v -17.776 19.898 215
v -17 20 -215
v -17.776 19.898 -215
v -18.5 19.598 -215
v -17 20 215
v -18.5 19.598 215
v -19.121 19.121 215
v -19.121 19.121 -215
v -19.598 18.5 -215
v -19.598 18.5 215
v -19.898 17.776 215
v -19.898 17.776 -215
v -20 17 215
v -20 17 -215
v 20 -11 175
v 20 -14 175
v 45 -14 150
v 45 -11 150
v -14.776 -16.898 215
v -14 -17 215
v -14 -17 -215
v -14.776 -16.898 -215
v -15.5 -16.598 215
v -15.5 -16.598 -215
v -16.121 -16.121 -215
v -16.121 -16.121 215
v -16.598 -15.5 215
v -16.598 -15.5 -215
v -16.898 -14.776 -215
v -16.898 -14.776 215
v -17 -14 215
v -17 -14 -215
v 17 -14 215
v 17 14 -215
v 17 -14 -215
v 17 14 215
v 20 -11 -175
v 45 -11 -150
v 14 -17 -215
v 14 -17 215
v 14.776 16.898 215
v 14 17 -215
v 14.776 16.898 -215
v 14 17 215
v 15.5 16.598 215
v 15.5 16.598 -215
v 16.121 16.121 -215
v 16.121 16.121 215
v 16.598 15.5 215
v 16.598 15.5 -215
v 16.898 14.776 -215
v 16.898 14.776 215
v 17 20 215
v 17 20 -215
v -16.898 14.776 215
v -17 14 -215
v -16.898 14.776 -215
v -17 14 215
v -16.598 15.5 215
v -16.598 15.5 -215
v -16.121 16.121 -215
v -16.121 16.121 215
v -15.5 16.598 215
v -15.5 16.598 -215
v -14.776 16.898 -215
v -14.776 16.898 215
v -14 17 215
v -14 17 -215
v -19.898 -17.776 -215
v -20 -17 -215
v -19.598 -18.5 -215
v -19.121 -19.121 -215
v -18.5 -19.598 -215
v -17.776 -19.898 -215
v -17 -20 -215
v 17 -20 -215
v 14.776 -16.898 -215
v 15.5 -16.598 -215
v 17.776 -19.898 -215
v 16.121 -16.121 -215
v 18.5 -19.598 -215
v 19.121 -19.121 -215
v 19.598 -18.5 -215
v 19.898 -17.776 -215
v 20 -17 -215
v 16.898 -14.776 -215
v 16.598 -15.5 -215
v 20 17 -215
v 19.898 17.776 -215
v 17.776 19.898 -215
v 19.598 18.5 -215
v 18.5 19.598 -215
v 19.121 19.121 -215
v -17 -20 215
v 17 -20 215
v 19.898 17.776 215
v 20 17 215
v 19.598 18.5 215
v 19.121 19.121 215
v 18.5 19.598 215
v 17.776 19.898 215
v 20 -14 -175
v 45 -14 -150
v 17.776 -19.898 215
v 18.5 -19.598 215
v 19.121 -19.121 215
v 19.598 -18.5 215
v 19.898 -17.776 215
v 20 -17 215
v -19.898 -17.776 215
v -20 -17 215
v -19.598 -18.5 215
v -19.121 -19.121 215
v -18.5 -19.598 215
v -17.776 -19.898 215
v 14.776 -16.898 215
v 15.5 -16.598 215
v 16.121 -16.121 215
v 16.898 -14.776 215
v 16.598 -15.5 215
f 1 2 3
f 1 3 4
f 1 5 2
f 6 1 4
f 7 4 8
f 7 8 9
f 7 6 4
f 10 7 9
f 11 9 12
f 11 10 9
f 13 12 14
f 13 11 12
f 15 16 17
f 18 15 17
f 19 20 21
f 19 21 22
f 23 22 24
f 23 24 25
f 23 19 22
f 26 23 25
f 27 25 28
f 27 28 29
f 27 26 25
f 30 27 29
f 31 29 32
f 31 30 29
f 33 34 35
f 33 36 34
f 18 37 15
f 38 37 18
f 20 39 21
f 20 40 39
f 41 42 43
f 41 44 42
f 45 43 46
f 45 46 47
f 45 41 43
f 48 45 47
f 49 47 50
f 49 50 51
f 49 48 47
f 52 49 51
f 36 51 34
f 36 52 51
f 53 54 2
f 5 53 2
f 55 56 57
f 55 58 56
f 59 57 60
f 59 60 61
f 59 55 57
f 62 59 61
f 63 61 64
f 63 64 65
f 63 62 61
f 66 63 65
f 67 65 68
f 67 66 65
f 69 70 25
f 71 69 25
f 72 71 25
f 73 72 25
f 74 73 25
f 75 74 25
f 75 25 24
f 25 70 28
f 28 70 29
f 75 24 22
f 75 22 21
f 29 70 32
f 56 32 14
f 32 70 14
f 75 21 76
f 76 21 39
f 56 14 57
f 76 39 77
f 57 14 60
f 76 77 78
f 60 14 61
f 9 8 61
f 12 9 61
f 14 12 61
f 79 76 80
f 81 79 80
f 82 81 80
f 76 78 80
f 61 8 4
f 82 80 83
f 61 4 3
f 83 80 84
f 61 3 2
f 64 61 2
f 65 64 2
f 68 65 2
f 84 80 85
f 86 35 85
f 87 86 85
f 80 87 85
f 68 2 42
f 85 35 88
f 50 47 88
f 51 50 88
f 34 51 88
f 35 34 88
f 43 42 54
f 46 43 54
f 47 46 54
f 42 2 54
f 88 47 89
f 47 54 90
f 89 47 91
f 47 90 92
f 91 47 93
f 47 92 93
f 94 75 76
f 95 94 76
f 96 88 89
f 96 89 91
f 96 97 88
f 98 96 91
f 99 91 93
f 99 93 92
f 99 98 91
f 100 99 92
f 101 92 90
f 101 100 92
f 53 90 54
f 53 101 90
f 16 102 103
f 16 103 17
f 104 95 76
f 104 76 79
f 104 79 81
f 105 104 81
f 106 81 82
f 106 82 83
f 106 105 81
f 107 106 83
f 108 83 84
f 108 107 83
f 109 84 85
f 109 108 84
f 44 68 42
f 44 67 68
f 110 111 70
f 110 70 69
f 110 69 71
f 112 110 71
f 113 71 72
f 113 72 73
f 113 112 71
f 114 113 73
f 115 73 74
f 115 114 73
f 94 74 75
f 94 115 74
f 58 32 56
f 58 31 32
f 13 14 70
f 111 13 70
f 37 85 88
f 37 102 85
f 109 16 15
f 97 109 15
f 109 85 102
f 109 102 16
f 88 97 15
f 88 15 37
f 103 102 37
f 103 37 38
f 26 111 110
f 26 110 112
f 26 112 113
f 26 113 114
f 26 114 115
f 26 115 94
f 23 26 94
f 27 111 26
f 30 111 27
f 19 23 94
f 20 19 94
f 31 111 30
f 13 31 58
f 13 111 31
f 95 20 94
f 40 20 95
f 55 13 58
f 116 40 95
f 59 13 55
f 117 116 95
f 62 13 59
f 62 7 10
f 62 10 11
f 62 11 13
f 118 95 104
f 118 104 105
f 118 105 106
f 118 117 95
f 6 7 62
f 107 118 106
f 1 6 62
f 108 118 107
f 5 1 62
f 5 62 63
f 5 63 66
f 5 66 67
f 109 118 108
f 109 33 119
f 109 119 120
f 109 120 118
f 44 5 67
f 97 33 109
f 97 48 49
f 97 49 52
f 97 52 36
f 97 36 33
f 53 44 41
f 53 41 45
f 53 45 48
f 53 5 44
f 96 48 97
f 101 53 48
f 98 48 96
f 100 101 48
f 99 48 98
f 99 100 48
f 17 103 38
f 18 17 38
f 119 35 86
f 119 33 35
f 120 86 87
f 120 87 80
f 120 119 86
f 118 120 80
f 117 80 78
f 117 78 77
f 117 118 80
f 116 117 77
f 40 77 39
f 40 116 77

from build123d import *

# Parameters (mm, degrees)
F1_DEPTH = 175
F2_W     = 3
F2_H     = 350
F3_DEPTH = 25
F5_DEPTH = 34.001
F7_DEPTH = 40


# Not quite as in the source:
# - a pattern or mirror of a feature is missing from the dataset's text; its kind, count and spacing are read off the source's solid


with BuildPart() as f1:
    # F0 (on Top) → F1 (new body, symmetric)
    with BuildSketch(Plane.XY):
        with BuildLine():
            ThreePointArc((20, 17), (19.1213203436, 19.1213203436), (17, 20))
            Line((17, 20), (-17, 20))
            ThreePointArc((-17, 20), (-19.1213203436, 19.1213203436), (-20, 17))
            Line((-20, 17), (-20, -17))
            ThreePointArc((-20, -17), (-19.1213203436, -19.1213203436), (-17, -20))
            Line((-17, -20), (17, -20))
            ThreePointArc((17, -20), (19.1213203436, -19.1213203436), (20, -17))
            Line((20, -17), (20, 17))
        make_face()
        with BuildLine():
            ThreePointArc((14, 17), (16.1213203436, 16.1213203436), (17, 14))
            Line((17, 14), (17, -14))
            ThreePointArc((17, -14), (16.1213203436, -16.1213203436), (14, -17))
            Line((14, -17), (-14, -17))
            ThreePointArc((-14, -17), (-16.1213203436, -16.1213203436), (-17, -14))
            Line((-17, -14), (-17, 14))
            ThreePointArc((-17, 14), (-16.1213203436, 16.1213203436), (-14, 17))
            Line((-14, 17), (14, 17))
        make_face(mode=Mode.SUBTRACT)
    extrude(amount=F1_DEPTH, both=True)

    # F2 (on face) → F3 (join)
    with BuildSketch(Plane.YZ.offset(20)):
        with Locations((-12.5, 0)):
            Rectangle(F2_W, F2_H)
    extrude(amount=F3_DEPTH)

    # F4 (on face) → F5 (cut, through all)
    with BuildSketch(Plane.XZ.offset(14)):
        Polygon((45, 175), (20, 175), (45, 150), align=None)
    f5 = extrude(amount=-F5_DEPTH, mode=Mode.SUBTRACT)

    # F5_copies: F5 across plane
    add(f5.mirror(Plane(origin=(0, 0, 0), x_dir=(-1, 0, 0), z_dir=(0, 0, -1))), mode=Mode.SUBTRACT)

    # F6 (on face) → F7 (join)
    with BuildSketch(Plane.XY.offset(175)):
        with BuildLine():
            Line((-20, 17), (-20, -17))
            ThreePointArc((-20, -17), (-19.1213203436, -19.1213203436), (-17, -20))
            Line((-17, -20), (17, -20))
            ThreePointArc((17, -20), (19.1213203436, -19.1213203436), (20, -17))
            Line((20, -17), (20, -14))
            Line((20, -14), (20, -11))
            Line((20, -11), (20, 17))
            ThreePointArc((20, 17), (19.1213203436, 19.1213203436), (17, 20))
            Line((17, 20), (-17, 20))
            ThreePointArc((-17, 20), (-19.1213203436, 19.1213203436), (-20, 17))
        make_face()
        with BuildLine():
            ThreePointArc((-14, -17), (-16.1213203436, -16.1213203436), (-17, -14))
            Line((-17, -14), (-17, 14))
            ThreePointArc((-17, 14), (-16.1213203436, 16.1213203436), (-14, 17))
            Line((-14, 17), (14, 17))
            ThreePointArc((14, 17), (16.1213203436, 16.1213203436), (17, 14))
            Line((17, 14), (17, -14))
            ThreePointArc((17, -14), (16.1213203436, -16.1213203436), (14, -17))
            Line((14, -17), (-14, -17))
        make_face(mode=Mode.SUBTRACT)
    f7 = extrude(amount=F7_DEPTH)

    # F7_copies: F7 across plane
    add(f7.mirror(Plane(origin=(0, 0, 0), x_dir=(-1, 0, 0), z_dir=(0, 0, -1))))


solid = f1.part
